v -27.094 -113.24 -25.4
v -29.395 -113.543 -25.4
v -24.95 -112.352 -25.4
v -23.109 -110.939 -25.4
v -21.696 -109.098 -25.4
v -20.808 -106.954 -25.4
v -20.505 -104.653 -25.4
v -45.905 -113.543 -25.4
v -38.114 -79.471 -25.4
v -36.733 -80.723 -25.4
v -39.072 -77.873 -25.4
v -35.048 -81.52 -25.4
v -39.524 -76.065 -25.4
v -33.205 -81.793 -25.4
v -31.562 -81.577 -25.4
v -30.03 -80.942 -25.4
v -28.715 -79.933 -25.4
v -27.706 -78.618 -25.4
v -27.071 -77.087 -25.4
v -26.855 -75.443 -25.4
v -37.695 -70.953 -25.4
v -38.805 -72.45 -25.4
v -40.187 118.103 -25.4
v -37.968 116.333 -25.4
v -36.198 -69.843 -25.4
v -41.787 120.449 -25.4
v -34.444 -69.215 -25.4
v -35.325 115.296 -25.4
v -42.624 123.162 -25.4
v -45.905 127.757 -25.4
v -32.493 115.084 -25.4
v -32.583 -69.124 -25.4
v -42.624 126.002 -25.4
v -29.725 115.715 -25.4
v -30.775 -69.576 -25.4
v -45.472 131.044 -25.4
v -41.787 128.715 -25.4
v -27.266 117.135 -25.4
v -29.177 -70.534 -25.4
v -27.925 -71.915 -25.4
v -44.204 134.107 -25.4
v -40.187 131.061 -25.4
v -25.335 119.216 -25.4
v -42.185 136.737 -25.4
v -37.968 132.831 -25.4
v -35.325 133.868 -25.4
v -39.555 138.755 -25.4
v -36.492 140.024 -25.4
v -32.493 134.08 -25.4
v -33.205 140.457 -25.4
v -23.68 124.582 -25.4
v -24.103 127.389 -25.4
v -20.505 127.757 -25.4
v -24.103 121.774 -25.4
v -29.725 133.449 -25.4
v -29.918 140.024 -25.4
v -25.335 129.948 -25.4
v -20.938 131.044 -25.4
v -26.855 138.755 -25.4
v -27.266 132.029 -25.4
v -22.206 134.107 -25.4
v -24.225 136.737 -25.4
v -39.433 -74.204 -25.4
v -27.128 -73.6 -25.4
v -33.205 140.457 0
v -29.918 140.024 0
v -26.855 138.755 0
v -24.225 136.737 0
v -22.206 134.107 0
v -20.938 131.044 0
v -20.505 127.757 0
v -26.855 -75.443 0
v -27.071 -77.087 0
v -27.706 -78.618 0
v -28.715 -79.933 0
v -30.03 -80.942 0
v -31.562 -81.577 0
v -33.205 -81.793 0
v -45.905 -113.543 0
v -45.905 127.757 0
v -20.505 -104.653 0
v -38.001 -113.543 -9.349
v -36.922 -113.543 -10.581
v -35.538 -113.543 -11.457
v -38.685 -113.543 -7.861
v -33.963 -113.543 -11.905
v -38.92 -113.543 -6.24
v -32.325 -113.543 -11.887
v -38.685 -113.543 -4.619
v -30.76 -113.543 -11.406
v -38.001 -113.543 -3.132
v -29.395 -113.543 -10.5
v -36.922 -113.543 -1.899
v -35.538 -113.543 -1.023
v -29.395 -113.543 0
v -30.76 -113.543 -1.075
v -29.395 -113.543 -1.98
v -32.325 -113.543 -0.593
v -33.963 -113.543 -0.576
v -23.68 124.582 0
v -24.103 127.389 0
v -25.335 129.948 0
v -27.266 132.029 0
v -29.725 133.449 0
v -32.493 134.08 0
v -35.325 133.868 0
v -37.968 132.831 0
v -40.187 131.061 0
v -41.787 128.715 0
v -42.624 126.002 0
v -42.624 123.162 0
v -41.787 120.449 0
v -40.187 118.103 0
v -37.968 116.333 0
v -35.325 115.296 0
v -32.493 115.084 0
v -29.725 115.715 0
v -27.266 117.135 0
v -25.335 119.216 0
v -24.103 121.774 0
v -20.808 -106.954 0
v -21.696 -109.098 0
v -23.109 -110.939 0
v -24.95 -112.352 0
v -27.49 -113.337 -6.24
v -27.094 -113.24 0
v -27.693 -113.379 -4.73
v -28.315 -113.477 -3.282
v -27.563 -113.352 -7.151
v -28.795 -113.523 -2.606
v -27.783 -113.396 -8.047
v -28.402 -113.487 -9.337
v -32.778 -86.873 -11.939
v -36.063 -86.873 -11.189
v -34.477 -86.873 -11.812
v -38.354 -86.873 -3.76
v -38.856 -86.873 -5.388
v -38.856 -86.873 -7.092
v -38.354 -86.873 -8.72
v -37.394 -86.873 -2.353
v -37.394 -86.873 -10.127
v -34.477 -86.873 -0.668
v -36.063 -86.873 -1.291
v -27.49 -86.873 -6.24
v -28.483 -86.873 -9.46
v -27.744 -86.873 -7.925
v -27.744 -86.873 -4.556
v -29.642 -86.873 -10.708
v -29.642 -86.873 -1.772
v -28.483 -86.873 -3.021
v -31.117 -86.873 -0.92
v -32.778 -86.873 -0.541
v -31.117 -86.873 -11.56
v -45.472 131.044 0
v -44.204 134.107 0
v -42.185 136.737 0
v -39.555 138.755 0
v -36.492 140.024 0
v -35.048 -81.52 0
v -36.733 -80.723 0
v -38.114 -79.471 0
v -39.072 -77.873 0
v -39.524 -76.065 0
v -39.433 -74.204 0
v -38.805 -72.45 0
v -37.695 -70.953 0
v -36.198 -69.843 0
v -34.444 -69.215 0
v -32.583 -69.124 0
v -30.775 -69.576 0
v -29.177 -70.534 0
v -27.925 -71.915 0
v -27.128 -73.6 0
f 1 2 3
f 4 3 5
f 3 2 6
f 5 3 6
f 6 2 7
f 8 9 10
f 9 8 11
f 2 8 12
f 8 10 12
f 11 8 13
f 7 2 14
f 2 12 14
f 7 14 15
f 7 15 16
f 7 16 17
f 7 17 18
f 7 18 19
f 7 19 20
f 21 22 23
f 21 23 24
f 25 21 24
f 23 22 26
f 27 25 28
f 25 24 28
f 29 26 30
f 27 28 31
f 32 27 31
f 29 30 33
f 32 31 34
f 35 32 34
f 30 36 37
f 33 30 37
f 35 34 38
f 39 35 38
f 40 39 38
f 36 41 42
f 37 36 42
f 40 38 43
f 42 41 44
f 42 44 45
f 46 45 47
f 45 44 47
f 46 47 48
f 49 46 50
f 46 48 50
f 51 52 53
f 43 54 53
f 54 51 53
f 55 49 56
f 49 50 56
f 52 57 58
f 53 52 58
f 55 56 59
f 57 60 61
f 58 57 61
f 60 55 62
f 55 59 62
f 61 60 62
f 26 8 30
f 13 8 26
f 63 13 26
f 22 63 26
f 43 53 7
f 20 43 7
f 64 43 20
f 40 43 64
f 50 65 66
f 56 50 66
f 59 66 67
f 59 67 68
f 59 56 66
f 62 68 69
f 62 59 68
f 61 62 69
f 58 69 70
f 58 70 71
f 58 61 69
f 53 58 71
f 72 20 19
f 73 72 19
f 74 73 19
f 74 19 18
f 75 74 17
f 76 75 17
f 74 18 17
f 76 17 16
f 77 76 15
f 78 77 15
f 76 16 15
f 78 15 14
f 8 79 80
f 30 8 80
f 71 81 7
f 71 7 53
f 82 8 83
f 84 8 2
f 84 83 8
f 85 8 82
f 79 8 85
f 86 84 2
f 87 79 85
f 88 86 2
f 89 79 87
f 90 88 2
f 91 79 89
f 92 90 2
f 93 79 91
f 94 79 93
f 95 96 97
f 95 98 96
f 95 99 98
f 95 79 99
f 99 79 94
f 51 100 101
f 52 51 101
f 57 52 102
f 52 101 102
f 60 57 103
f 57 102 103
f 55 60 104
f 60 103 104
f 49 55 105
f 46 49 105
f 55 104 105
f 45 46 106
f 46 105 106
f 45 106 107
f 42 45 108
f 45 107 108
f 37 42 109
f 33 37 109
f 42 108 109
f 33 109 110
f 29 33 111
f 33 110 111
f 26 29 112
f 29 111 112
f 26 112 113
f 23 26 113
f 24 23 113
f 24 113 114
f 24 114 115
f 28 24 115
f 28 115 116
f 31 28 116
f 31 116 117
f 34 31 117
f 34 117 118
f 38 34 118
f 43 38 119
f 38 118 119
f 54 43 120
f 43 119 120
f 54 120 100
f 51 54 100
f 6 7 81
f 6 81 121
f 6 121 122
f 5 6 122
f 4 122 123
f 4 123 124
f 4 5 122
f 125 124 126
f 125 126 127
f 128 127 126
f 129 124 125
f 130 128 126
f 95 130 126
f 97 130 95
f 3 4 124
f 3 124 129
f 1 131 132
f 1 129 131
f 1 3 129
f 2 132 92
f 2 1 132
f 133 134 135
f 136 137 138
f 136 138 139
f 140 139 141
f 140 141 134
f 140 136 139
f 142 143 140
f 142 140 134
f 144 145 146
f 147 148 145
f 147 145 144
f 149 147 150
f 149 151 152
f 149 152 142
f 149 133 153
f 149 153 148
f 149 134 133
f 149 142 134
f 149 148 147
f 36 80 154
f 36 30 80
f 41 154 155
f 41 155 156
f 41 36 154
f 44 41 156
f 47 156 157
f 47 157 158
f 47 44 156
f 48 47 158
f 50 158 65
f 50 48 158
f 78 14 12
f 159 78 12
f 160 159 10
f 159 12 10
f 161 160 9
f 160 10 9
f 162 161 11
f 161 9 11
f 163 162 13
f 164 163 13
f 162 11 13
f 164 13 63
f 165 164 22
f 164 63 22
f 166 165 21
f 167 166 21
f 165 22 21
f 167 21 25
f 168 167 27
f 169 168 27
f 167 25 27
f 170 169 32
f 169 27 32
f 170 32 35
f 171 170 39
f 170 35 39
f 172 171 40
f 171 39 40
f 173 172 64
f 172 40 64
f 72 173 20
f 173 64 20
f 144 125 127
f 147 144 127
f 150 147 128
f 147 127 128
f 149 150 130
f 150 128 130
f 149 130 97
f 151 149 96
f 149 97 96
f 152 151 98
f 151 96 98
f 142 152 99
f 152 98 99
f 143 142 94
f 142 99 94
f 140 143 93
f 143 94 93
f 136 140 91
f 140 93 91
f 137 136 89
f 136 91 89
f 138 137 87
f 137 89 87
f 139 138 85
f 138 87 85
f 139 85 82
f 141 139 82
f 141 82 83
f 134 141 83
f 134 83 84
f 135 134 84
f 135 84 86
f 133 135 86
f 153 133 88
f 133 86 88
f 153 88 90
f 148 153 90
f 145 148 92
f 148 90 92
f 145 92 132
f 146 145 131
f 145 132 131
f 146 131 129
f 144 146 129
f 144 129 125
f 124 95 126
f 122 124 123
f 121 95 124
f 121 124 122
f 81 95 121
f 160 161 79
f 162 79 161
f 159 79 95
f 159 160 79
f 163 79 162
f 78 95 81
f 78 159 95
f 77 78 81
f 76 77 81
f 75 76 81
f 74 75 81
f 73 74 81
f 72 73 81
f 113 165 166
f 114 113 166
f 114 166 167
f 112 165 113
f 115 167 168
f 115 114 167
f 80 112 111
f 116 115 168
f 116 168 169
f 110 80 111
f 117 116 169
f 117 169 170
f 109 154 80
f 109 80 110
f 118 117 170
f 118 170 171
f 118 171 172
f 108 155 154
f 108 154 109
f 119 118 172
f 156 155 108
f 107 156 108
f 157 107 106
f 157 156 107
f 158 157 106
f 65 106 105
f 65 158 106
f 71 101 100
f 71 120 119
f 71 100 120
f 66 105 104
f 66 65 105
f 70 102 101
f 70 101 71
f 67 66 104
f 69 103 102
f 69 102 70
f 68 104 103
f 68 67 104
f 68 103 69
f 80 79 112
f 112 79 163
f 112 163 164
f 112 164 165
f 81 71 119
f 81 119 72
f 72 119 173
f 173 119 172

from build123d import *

# Parameters (mm, degrees)
F0_W        = 25.4
F0_H        = 254
F0_R        = 9.525
F1_DEPTH    = 25.4
F2_R        = 12.69999
F3_R        = 5.715
F4_DEPTH    = 26.67
F6_DEPTH    = 25.4
F7_T1_DEPTH = 69.85


# Not quite as in the source:
# - a fillet or chamfer that OpenCascade refuses, or shapes differently, is made with other operations: its cross-section is extruded or revolved along the edge and cut away or added
# - a fillet or chamfer is up to 0.001 mm smaller than in the source, because OpenCascade refuses the exact size


with BuildPart() as f1:
    # F0 (on Top) → F1 (new body)
    with BuildSketch(Plane.XY):
        with Locations((-33.2050182253, 13.4569510469)):
            Rectangle(F0_W, F0_H)
        with Locations((-33.2050182253, 124.5819510469)):
            Circle(F0_R, mode=Mode.SUBTRACT)
    extrude(amount=-F1_DEPTH)

    # F2 (radius 12.7 in the source; OpenCascade refuses exactly that, so slightly less here)
    f2_edges = [f1.edges().sort_by_distance(p)[0] for p in [
        (-45.905018, 140.456951, -12.7),
        (-20.505018, 140.456951, -12.7),
    ]]
    fillet(f2_edges, radius=F2_R)

    # F3 (on face) → F4 (cut)
    with BuildSketch(Plane.XZ.offset(113.5430489531)):
        with Locations((-33.2050182253, -6.2401448376)):
            Circle(F3_R)
    extrude(amount=-F4_DEPTH, mode=Mode.SUBTRACT)

    # F5 (on face) → F6 (cut)
    with BuildSketch(Plane(origin=(0, 0, -25.4), x_dir=(1, 0, 0), z_dir=(0, 0, -1))):
        with BuildLine():
            ThreePointArc((-33.2050182253, 81.7930489531), (-37.6951462858, 70.9529208925), (-26.8550182253, 75.4430489531))
            ThreePointArc((-26.8550182253, 75.4430489531), (-28.7148901648, 79.9331770136), (-33.2050182253, 81.7930489531))
        make_face()
    extrude(amount=-F6_DEPTH, mode=Mode.SUBTRACT)

    # F7: fillet of radius 8.89 on 1 edges, made by hand

    # F7_s2 → F7_t1 (cut)
    with BuildSketch(Plane.XY.offset(-47.625)):
        with BuildLine():
            ThreePointArc((-20.5050182253, -104.6530489531), (-23.1088389406, -110.9392282378), (-29.3950182253, -113.5430489531))
            Line((-29.3950182253, -113.5430489531), (-20.5050182253, -113.5430489531))
            Line((-20.5050182253, -113.5430489531), (-20.5050182253, -104.6530489531))
        make_face()
    extrude(amount=F7_T1_DEPTH, mode=Mode.SUBTRACT)


solid = f1.part
